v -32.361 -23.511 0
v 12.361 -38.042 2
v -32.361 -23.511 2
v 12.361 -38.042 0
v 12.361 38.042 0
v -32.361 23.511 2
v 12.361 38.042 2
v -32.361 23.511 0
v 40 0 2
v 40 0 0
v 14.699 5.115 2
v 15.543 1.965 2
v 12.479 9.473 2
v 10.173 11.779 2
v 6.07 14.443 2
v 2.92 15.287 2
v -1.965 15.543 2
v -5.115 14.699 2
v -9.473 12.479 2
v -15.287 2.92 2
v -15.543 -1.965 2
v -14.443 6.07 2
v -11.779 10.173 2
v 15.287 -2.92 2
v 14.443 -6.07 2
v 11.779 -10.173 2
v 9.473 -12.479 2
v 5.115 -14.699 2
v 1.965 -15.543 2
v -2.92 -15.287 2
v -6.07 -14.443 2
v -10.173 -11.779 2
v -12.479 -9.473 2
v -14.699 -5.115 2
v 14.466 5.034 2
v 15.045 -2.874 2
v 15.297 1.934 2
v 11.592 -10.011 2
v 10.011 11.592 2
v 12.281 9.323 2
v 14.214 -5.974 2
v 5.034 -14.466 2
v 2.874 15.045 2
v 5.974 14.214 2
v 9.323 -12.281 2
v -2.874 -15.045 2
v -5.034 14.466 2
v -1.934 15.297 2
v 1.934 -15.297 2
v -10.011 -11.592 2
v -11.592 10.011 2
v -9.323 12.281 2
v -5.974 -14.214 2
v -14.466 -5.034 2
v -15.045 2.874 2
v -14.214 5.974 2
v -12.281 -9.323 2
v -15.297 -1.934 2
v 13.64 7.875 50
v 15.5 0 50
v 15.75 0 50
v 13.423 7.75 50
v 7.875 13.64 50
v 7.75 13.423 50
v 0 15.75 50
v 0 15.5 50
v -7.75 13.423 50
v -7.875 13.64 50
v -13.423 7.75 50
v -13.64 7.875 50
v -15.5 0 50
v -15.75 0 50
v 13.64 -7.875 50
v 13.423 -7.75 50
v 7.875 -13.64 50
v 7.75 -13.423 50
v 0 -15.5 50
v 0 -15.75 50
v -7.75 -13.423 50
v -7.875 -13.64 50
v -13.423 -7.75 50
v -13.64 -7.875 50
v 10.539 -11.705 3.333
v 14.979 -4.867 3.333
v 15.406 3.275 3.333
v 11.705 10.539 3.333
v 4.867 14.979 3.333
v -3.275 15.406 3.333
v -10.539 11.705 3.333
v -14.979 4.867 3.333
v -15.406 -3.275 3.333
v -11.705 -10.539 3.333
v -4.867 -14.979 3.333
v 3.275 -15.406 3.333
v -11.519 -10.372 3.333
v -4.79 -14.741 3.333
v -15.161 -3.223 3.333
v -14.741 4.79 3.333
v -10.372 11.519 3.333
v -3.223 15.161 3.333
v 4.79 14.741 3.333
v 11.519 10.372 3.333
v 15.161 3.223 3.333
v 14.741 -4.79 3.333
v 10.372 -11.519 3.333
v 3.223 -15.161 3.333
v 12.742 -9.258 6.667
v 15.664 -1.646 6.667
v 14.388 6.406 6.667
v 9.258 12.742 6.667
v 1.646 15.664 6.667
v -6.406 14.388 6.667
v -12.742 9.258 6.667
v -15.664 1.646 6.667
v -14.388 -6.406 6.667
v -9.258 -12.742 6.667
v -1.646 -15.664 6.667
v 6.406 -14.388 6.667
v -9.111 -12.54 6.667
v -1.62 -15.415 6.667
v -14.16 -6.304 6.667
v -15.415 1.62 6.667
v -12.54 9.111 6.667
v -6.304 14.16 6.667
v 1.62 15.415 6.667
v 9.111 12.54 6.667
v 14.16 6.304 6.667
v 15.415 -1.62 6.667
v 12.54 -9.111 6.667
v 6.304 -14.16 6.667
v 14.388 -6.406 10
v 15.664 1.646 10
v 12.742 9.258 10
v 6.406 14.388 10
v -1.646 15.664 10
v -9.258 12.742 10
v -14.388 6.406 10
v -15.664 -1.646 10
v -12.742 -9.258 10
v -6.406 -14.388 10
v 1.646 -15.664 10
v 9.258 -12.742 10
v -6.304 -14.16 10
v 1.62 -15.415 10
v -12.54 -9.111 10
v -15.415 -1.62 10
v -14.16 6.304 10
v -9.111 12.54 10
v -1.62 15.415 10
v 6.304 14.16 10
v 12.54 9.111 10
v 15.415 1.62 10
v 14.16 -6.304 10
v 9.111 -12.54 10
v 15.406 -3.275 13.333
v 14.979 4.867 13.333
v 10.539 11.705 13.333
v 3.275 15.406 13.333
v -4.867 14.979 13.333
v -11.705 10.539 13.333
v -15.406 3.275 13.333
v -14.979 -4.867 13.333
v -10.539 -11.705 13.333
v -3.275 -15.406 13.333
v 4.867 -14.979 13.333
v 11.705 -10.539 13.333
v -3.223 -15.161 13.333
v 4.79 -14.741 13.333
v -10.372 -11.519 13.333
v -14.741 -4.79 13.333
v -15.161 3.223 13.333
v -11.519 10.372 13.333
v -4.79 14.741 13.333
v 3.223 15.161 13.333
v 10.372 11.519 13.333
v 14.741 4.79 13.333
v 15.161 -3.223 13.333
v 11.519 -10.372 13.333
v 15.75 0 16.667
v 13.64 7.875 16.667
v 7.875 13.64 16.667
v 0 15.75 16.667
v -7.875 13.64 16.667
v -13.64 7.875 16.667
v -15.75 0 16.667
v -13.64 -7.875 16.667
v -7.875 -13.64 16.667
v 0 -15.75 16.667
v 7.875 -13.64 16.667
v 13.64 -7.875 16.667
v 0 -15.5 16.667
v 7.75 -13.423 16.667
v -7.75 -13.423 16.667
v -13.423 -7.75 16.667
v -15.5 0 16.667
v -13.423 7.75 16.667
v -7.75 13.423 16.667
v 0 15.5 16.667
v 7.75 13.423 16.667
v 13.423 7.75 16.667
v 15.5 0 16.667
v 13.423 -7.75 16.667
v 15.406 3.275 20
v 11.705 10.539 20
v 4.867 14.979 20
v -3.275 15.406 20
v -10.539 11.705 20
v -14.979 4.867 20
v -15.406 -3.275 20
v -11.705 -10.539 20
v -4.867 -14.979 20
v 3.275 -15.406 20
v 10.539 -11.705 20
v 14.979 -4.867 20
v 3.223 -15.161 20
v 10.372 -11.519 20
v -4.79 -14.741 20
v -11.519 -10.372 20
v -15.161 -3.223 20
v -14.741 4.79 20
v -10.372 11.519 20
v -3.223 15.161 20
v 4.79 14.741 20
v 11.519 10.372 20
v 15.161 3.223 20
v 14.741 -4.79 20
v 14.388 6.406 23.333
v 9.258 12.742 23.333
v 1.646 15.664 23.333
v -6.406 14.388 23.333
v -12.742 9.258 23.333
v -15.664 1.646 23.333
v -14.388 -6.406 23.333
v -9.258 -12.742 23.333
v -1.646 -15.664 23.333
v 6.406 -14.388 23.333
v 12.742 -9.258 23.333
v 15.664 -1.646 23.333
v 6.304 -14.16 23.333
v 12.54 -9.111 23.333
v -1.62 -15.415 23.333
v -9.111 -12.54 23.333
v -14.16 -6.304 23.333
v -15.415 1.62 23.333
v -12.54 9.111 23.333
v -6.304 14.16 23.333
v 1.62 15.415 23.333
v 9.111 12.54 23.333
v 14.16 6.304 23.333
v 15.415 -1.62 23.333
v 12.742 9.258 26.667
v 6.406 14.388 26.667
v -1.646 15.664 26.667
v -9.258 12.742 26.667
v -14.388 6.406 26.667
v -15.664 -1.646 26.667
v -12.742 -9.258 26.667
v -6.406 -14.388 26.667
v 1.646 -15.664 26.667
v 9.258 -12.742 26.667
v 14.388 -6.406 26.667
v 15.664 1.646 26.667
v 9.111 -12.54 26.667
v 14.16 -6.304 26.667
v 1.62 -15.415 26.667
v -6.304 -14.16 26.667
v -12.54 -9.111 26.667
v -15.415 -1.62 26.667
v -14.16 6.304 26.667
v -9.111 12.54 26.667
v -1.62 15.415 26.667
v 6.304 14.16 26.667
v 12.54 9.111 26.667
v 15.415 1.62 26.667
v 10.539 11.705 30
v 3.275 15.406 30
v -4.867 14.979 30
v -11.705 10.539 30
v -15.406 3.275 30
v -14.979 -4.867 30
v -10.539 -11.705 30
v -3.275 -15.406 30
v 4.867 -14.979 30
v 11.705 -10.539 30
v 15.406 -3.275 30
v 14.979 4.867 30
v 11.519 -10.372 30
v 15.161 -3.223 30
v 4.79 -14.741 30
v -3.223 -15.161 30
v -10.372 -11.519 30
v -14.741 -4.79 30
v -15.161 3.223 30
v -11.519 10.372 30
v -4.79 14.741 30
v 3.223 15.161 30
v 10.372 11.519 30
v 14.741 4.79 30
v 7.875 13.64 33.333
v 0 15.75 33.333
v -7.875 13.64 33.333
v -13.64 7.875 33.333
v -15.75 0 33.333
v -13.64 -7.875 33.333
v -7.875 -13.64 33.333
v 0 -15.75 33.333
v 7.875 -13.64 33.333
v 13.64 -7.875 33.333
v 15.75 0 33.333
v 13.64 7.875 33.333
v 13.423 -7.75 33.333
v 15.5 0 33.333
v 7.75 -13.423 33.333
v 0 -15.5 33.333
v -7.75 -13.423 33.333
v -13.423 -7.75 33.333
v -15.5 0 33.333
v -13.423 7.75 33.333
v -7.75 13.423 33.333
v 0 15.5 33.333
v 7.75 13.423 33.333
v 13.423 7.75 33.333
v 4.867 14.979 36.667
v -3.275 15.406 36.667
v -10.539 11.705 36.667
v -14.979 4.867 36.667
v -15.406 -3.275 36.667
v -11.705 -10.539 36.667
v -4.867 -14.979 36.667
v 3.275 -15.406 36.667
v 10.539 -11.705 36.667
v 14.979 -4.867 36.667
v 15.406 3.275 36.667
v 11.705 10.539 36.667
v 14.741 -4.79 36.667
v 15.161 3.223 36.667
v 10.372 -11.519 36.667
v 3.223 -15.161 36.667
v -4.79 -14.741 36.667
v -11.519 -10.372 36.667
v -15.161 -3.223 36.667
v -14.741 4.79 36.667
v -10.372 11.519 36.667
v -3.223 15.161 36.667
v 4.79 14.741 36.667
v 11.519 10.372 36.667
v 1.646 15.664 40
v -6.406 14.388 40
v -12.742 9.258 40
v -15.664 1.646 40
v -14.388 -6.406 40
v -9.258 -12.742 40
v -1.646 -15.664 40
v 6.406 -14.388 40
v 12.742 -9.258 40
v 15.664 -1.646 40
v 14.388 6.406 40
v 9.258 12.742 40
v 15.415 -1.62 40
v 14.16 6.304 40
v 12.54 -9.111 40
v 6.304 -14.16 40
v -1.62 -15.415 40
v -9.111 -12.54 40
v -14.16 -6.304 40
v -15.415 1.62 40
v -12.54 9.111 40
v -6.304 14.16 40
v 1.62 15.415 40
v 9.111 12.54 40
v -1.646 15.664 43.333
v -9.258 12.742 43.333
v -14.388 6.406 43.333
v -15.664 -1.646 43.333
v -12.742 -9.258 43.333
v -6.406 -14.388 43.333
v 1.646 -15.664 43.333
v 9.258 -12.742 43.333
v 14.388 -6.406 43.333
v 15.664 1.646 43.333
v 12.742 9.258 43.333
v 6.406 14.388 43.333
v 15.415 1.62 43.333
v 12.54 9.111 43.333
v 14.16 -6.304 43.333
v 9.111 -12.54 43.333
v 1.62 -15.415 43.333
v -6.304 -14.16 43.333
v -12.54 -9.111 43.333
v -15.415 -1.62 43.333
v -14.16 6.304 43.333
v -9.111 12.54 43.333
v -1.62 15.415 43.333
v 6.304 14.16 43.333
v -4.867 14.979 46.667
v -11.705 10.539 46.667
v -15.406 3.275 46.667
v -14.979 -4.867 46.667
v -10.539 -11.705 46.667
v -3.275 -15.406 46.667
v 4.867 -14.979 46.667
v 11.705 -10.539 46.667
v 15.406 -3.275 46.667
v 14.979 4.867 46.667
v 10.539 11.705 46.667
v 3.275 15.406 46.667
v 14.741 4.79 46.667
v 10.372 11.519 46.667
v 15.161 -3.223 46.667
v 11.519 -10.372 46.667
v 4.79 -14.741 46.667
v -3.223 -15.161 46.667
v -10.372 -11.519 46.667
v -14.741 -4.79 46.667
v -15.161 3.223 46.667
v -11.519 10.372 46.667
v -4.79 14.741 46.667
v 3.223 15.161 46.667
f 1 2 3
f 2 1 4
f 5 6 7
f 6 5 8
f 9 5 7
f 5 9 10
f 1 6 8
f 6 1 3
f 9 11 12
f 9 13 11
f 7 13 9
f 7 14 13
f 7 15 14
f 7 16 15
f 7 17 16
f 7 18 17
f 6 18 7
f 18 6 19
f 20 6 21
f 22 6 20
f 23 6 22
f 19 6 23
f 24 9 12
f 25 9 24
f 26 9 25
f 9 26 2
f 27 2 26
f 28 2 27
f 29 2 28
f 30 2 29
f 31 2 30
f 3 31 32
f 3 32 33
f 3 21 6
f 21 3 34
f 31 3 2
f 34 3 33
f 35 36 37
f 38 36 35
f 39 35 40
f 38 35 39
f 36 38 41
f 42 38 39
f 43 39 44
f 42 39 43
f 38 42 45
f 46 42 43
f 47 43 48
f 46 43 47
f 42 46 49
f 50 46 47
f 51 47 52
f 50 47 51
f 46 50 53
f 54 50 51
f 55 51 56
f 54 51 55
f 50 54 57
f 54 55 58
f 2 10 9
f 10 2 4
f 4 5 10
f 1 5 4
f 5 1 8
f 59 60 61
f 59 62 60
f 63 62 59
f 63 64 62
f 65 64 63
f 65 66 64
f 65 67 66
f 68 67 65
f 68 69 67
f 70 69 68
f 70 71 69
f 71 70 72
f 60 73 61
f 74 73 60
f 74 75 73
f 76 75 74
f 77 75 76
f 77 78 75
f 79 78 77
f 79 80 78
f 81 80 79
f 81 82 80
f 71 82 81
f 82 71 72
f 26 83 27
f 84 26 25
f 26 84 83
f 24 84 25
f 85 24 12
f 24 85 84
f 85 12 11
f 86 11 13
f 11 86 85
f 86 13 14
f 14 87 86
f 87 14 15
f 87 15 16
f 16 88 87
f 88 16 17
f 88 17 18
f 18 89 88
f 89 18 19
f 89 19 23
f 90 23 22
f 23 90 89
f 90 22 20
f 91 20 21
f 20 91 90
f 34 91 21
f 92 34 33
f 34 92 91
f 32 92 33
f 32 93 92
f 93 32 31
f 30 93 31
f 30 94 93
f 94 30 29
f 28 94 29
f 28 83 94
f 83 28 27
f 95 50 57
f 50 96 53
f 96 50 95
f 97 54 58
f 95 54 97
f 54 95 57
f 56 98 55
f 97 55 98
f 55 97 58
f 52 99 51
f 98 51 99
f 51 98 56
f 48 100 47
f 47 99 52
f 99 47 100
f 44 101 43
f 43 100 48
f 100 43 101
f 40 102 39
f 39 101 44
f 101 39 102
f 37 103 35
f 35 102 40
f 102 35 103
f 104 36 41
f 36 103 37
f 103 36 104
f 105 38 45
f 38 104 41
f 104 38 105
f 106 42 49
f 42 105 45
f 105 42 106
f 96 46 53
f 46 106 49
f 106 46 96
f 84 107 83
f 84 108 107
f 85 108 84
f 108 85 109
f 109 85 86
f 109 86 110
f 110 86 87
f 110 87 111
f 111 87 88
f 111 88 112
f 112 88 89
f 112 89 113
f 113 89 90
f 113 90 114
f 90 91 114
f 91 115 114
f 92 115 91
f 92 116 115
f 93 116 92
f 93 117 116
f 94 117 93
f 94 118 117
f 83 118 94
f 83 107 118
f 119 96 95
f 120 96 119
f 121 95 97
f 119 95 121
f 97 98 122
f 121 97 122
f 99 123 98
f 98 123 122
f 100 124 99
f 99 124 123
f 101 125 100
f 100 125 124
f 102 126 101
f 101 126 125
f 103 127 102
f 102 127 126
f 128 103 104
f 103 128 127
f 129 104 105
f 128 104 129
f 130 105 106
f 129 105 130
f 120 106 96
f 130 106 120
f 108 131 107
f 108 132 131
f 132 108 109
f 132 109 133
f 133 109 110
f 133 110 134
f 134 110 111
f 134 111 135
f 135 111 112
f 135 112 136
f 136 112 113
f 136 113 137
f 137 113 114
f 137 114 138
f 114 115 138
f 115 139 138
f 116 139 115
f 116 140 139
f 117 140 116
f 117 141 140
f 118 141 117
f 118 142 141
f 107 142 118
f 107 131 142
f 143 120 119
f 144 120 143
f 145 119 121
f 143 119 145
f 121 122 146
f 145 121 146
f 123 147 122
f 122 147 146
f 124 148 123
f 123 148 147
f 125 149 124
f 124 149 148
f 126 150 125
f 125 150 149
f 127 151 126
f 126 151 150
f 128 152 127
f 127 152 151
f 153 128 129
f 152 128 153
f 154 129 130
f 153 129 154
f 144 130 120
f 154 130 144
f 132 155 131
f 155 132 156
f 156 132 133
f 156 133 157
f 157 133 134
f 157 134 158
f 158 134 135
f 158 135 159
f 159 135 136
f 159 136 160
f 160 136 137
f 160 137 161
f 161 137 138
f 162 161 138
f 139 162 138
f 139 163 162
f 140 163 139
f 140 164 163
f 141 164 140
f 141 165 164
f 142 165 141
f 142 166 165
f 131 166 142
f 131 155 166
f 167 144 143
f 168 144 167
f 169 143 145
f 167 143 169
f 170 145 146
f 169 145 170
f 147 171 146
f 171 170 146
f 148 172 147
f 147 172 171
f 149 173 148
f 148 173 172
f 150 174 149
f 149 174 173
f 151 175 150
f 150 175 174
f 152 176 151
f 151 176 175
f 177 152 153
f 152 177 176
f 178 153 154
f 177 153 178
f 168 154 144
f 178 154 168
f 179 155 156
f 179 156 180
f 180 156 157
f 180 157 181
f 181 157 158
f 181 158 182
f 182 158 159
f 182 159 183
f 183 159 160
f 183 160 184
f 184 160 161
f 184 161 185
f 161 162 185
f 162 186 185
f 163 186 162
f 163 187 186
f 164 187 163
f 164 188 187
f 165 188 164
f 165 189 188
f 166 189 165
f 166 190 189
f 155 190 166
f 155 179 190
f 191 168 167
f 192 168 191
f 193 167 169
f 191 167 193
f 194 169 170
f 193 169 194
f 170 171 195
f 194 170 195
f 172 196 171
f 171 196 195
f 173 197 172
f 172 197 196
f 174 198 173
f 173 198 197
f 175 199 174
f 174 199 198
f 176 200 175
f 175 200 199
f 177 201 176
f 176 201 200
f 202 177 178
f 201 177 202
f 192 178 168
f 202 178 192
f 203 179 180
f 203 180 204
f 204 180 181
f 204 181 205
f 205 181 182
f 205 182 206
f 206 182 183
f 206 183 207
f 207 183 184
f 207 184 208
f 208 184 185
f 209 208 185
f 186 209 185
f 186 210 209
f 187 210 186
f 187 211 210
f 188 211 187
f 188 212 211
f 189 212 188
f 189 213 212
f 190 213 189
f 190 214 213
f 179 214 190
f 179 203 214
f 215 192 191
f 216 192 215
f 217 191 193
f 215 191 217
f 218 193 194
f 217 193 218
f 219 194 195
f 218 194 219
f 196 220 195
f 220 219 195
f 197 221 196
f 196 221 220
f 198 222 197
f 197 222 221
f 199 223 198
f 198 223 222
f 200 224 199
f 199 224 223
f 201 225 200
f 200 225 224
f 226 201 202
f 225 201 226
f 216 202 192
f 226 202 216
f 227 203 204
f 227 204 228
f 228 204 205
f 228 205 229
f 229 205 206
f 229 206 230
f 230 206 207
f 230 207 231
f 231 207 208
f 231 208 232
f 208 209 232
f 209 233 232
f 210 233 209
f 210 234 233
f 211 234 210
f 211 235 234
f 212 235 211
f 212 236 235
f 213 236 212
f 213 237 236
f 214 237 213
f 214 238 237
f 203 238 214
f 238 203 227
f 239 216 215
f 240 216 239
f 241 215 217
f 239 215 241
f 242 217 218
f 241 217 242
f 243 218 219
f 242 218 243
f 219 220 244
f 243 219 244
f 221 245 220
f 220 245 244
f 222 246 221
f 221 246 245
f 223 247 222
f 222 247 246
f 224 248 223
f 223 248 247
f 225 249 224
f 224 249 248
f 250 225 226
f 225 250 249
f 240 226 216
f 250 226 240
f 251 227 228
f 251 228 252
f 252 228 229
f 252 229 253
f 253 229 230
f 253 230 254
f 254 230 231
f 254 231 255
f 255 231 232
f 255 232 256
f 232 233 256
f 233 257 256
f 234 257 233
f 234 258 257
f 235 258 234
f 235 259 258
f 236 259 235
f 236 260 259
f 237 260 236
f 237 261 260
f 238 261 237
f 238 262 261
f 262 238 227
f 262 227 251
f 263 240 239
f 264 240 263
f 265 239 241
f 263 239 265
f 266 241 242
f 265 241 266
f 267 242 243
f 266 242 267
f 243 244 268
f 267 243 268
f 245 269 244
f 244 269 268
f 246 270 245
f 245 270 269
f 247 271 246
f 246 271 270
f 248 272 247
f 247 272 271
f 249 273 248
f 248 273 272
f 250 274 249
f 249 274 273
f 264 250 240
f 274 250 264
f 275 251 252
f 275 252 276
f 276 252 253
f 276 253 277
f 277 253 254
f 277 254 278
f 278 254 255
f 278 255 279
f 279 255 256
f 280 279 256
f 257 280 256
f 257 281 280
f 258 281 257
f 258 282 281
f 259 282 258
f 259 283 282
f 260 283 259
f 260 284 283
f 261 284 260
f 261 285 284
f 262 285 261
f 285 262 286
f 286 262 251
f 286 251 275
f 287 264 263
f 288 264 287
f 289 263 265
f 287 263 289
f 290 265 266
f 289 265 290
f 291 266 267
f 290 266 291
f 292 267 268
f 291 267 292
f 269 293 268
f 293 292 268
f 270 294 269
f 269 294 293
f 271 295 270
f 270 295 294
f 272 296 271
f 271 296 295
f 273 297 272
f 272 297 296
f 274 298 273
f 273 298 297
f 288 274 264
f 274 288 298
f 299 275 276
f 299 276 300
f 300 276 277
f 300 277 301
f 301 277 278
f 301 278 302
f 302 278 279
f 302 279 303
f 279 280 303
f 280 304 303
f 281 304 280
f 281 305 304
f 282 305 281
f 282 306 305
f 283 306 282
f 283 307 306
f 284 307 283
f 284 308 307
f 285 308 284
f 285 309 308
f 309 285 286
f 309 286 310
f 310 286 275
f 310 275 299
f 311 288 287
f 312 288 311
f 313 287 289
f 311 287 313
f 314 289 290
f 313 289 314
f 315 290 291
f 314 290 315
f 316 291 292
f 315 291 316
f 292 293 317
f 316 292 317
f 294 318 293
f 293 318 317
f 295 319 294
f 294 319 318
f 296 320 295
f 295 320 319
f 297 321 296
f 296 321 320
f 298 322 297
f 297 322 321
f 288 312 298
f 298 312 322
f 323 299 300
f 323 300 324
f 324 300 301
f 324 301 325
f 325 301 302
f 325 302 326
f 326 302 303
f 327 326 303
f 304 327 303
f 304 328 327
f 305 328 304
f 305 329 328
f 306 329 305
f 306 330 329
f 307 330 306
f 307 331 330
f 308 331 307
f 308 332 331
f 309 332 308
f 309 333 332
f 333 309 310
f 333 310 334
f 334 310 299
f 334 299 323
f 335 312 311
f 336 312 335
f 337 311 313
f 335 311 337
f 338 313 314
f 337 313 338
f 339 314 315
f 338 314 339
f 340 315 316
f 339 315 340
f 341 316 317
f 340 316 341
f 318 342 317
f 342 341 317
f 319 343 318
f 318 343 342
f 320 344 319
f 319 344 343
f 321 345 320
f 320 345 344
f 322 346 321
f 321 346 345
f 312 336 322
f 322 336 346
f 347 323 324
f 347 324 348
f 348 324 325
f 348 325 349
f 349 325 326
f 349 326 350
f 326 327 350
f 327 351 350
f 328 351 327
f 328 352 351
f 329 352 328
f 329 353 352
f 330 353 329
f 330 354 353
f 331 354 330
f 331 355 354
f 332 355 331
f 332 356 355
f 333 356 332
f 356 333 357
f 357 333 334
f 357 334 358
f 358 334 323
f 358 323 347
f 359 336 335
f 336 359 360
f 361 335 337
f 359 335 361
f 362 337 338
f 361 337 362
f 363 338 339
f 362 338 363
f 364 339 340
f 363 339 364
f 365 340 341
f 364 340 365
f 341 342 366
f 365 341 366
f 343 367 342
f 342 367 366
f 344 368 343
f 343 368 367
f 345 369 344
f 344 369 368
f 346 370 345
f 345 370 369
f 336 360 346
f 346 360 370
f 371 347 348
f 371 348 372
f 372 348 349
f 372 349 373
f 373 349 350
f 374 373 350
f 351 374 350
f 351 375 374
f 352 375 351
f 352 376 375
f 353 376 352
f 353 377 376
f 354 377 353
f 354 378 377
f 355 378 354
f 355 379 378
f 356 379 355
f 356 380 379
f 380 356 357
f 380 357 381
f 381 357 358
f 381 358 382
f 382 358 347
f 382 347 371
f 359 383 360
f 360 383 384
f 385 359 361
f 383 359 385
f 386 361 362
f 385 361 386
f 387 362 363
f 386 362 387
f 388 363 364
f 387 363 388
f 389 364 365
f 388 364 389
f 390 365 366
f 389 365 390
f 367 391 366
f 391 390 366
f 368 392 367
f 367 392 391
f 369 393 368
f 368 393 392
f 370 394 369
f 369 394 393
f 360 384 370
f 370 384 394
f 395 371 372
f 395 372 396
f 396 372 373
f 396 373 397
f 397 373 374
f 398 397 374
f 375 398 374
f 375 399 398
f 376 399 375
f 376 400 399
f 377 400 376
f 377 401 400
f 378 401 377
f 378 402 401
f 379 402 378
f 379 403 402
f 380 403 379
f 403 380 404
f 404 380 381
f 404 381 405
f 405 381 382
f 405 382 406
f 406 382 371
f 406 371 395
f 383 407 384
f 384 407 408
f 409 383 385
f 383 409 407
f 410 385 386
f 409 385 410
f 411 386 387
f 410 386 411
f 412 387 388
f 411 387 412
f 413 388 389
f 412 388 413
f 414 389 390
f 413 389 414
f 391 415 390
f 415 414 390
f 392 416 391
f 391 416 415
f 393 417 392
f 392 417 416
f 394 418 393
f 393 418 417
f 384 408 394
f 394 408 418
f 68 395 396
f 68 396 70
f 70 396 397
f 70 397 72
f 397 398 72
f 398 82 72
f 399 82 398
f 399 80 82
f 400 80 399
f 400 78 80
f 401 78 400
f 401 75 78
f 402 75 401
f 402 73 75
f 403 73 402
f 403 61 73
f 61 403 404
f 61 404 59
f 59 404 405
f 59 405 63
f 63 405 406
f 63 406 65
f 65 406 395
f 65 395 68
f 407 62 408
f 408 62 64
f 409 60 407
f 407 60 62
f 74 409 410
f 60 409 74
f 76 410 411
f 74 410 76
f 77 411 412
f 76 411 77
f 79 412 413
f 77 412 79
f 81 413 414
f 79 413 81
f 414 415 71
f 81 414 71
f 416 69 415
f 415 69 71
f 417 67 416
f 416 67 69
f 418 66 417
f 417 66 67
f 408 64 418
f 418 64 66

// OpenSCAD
cylinder(d=80,2,$fn=5);

linear_extrude(height = 50,twist = -180 ){
difference(){
circle(d=31.5,$fn=12);
circle(d=31,$fn=12);
    }
}
